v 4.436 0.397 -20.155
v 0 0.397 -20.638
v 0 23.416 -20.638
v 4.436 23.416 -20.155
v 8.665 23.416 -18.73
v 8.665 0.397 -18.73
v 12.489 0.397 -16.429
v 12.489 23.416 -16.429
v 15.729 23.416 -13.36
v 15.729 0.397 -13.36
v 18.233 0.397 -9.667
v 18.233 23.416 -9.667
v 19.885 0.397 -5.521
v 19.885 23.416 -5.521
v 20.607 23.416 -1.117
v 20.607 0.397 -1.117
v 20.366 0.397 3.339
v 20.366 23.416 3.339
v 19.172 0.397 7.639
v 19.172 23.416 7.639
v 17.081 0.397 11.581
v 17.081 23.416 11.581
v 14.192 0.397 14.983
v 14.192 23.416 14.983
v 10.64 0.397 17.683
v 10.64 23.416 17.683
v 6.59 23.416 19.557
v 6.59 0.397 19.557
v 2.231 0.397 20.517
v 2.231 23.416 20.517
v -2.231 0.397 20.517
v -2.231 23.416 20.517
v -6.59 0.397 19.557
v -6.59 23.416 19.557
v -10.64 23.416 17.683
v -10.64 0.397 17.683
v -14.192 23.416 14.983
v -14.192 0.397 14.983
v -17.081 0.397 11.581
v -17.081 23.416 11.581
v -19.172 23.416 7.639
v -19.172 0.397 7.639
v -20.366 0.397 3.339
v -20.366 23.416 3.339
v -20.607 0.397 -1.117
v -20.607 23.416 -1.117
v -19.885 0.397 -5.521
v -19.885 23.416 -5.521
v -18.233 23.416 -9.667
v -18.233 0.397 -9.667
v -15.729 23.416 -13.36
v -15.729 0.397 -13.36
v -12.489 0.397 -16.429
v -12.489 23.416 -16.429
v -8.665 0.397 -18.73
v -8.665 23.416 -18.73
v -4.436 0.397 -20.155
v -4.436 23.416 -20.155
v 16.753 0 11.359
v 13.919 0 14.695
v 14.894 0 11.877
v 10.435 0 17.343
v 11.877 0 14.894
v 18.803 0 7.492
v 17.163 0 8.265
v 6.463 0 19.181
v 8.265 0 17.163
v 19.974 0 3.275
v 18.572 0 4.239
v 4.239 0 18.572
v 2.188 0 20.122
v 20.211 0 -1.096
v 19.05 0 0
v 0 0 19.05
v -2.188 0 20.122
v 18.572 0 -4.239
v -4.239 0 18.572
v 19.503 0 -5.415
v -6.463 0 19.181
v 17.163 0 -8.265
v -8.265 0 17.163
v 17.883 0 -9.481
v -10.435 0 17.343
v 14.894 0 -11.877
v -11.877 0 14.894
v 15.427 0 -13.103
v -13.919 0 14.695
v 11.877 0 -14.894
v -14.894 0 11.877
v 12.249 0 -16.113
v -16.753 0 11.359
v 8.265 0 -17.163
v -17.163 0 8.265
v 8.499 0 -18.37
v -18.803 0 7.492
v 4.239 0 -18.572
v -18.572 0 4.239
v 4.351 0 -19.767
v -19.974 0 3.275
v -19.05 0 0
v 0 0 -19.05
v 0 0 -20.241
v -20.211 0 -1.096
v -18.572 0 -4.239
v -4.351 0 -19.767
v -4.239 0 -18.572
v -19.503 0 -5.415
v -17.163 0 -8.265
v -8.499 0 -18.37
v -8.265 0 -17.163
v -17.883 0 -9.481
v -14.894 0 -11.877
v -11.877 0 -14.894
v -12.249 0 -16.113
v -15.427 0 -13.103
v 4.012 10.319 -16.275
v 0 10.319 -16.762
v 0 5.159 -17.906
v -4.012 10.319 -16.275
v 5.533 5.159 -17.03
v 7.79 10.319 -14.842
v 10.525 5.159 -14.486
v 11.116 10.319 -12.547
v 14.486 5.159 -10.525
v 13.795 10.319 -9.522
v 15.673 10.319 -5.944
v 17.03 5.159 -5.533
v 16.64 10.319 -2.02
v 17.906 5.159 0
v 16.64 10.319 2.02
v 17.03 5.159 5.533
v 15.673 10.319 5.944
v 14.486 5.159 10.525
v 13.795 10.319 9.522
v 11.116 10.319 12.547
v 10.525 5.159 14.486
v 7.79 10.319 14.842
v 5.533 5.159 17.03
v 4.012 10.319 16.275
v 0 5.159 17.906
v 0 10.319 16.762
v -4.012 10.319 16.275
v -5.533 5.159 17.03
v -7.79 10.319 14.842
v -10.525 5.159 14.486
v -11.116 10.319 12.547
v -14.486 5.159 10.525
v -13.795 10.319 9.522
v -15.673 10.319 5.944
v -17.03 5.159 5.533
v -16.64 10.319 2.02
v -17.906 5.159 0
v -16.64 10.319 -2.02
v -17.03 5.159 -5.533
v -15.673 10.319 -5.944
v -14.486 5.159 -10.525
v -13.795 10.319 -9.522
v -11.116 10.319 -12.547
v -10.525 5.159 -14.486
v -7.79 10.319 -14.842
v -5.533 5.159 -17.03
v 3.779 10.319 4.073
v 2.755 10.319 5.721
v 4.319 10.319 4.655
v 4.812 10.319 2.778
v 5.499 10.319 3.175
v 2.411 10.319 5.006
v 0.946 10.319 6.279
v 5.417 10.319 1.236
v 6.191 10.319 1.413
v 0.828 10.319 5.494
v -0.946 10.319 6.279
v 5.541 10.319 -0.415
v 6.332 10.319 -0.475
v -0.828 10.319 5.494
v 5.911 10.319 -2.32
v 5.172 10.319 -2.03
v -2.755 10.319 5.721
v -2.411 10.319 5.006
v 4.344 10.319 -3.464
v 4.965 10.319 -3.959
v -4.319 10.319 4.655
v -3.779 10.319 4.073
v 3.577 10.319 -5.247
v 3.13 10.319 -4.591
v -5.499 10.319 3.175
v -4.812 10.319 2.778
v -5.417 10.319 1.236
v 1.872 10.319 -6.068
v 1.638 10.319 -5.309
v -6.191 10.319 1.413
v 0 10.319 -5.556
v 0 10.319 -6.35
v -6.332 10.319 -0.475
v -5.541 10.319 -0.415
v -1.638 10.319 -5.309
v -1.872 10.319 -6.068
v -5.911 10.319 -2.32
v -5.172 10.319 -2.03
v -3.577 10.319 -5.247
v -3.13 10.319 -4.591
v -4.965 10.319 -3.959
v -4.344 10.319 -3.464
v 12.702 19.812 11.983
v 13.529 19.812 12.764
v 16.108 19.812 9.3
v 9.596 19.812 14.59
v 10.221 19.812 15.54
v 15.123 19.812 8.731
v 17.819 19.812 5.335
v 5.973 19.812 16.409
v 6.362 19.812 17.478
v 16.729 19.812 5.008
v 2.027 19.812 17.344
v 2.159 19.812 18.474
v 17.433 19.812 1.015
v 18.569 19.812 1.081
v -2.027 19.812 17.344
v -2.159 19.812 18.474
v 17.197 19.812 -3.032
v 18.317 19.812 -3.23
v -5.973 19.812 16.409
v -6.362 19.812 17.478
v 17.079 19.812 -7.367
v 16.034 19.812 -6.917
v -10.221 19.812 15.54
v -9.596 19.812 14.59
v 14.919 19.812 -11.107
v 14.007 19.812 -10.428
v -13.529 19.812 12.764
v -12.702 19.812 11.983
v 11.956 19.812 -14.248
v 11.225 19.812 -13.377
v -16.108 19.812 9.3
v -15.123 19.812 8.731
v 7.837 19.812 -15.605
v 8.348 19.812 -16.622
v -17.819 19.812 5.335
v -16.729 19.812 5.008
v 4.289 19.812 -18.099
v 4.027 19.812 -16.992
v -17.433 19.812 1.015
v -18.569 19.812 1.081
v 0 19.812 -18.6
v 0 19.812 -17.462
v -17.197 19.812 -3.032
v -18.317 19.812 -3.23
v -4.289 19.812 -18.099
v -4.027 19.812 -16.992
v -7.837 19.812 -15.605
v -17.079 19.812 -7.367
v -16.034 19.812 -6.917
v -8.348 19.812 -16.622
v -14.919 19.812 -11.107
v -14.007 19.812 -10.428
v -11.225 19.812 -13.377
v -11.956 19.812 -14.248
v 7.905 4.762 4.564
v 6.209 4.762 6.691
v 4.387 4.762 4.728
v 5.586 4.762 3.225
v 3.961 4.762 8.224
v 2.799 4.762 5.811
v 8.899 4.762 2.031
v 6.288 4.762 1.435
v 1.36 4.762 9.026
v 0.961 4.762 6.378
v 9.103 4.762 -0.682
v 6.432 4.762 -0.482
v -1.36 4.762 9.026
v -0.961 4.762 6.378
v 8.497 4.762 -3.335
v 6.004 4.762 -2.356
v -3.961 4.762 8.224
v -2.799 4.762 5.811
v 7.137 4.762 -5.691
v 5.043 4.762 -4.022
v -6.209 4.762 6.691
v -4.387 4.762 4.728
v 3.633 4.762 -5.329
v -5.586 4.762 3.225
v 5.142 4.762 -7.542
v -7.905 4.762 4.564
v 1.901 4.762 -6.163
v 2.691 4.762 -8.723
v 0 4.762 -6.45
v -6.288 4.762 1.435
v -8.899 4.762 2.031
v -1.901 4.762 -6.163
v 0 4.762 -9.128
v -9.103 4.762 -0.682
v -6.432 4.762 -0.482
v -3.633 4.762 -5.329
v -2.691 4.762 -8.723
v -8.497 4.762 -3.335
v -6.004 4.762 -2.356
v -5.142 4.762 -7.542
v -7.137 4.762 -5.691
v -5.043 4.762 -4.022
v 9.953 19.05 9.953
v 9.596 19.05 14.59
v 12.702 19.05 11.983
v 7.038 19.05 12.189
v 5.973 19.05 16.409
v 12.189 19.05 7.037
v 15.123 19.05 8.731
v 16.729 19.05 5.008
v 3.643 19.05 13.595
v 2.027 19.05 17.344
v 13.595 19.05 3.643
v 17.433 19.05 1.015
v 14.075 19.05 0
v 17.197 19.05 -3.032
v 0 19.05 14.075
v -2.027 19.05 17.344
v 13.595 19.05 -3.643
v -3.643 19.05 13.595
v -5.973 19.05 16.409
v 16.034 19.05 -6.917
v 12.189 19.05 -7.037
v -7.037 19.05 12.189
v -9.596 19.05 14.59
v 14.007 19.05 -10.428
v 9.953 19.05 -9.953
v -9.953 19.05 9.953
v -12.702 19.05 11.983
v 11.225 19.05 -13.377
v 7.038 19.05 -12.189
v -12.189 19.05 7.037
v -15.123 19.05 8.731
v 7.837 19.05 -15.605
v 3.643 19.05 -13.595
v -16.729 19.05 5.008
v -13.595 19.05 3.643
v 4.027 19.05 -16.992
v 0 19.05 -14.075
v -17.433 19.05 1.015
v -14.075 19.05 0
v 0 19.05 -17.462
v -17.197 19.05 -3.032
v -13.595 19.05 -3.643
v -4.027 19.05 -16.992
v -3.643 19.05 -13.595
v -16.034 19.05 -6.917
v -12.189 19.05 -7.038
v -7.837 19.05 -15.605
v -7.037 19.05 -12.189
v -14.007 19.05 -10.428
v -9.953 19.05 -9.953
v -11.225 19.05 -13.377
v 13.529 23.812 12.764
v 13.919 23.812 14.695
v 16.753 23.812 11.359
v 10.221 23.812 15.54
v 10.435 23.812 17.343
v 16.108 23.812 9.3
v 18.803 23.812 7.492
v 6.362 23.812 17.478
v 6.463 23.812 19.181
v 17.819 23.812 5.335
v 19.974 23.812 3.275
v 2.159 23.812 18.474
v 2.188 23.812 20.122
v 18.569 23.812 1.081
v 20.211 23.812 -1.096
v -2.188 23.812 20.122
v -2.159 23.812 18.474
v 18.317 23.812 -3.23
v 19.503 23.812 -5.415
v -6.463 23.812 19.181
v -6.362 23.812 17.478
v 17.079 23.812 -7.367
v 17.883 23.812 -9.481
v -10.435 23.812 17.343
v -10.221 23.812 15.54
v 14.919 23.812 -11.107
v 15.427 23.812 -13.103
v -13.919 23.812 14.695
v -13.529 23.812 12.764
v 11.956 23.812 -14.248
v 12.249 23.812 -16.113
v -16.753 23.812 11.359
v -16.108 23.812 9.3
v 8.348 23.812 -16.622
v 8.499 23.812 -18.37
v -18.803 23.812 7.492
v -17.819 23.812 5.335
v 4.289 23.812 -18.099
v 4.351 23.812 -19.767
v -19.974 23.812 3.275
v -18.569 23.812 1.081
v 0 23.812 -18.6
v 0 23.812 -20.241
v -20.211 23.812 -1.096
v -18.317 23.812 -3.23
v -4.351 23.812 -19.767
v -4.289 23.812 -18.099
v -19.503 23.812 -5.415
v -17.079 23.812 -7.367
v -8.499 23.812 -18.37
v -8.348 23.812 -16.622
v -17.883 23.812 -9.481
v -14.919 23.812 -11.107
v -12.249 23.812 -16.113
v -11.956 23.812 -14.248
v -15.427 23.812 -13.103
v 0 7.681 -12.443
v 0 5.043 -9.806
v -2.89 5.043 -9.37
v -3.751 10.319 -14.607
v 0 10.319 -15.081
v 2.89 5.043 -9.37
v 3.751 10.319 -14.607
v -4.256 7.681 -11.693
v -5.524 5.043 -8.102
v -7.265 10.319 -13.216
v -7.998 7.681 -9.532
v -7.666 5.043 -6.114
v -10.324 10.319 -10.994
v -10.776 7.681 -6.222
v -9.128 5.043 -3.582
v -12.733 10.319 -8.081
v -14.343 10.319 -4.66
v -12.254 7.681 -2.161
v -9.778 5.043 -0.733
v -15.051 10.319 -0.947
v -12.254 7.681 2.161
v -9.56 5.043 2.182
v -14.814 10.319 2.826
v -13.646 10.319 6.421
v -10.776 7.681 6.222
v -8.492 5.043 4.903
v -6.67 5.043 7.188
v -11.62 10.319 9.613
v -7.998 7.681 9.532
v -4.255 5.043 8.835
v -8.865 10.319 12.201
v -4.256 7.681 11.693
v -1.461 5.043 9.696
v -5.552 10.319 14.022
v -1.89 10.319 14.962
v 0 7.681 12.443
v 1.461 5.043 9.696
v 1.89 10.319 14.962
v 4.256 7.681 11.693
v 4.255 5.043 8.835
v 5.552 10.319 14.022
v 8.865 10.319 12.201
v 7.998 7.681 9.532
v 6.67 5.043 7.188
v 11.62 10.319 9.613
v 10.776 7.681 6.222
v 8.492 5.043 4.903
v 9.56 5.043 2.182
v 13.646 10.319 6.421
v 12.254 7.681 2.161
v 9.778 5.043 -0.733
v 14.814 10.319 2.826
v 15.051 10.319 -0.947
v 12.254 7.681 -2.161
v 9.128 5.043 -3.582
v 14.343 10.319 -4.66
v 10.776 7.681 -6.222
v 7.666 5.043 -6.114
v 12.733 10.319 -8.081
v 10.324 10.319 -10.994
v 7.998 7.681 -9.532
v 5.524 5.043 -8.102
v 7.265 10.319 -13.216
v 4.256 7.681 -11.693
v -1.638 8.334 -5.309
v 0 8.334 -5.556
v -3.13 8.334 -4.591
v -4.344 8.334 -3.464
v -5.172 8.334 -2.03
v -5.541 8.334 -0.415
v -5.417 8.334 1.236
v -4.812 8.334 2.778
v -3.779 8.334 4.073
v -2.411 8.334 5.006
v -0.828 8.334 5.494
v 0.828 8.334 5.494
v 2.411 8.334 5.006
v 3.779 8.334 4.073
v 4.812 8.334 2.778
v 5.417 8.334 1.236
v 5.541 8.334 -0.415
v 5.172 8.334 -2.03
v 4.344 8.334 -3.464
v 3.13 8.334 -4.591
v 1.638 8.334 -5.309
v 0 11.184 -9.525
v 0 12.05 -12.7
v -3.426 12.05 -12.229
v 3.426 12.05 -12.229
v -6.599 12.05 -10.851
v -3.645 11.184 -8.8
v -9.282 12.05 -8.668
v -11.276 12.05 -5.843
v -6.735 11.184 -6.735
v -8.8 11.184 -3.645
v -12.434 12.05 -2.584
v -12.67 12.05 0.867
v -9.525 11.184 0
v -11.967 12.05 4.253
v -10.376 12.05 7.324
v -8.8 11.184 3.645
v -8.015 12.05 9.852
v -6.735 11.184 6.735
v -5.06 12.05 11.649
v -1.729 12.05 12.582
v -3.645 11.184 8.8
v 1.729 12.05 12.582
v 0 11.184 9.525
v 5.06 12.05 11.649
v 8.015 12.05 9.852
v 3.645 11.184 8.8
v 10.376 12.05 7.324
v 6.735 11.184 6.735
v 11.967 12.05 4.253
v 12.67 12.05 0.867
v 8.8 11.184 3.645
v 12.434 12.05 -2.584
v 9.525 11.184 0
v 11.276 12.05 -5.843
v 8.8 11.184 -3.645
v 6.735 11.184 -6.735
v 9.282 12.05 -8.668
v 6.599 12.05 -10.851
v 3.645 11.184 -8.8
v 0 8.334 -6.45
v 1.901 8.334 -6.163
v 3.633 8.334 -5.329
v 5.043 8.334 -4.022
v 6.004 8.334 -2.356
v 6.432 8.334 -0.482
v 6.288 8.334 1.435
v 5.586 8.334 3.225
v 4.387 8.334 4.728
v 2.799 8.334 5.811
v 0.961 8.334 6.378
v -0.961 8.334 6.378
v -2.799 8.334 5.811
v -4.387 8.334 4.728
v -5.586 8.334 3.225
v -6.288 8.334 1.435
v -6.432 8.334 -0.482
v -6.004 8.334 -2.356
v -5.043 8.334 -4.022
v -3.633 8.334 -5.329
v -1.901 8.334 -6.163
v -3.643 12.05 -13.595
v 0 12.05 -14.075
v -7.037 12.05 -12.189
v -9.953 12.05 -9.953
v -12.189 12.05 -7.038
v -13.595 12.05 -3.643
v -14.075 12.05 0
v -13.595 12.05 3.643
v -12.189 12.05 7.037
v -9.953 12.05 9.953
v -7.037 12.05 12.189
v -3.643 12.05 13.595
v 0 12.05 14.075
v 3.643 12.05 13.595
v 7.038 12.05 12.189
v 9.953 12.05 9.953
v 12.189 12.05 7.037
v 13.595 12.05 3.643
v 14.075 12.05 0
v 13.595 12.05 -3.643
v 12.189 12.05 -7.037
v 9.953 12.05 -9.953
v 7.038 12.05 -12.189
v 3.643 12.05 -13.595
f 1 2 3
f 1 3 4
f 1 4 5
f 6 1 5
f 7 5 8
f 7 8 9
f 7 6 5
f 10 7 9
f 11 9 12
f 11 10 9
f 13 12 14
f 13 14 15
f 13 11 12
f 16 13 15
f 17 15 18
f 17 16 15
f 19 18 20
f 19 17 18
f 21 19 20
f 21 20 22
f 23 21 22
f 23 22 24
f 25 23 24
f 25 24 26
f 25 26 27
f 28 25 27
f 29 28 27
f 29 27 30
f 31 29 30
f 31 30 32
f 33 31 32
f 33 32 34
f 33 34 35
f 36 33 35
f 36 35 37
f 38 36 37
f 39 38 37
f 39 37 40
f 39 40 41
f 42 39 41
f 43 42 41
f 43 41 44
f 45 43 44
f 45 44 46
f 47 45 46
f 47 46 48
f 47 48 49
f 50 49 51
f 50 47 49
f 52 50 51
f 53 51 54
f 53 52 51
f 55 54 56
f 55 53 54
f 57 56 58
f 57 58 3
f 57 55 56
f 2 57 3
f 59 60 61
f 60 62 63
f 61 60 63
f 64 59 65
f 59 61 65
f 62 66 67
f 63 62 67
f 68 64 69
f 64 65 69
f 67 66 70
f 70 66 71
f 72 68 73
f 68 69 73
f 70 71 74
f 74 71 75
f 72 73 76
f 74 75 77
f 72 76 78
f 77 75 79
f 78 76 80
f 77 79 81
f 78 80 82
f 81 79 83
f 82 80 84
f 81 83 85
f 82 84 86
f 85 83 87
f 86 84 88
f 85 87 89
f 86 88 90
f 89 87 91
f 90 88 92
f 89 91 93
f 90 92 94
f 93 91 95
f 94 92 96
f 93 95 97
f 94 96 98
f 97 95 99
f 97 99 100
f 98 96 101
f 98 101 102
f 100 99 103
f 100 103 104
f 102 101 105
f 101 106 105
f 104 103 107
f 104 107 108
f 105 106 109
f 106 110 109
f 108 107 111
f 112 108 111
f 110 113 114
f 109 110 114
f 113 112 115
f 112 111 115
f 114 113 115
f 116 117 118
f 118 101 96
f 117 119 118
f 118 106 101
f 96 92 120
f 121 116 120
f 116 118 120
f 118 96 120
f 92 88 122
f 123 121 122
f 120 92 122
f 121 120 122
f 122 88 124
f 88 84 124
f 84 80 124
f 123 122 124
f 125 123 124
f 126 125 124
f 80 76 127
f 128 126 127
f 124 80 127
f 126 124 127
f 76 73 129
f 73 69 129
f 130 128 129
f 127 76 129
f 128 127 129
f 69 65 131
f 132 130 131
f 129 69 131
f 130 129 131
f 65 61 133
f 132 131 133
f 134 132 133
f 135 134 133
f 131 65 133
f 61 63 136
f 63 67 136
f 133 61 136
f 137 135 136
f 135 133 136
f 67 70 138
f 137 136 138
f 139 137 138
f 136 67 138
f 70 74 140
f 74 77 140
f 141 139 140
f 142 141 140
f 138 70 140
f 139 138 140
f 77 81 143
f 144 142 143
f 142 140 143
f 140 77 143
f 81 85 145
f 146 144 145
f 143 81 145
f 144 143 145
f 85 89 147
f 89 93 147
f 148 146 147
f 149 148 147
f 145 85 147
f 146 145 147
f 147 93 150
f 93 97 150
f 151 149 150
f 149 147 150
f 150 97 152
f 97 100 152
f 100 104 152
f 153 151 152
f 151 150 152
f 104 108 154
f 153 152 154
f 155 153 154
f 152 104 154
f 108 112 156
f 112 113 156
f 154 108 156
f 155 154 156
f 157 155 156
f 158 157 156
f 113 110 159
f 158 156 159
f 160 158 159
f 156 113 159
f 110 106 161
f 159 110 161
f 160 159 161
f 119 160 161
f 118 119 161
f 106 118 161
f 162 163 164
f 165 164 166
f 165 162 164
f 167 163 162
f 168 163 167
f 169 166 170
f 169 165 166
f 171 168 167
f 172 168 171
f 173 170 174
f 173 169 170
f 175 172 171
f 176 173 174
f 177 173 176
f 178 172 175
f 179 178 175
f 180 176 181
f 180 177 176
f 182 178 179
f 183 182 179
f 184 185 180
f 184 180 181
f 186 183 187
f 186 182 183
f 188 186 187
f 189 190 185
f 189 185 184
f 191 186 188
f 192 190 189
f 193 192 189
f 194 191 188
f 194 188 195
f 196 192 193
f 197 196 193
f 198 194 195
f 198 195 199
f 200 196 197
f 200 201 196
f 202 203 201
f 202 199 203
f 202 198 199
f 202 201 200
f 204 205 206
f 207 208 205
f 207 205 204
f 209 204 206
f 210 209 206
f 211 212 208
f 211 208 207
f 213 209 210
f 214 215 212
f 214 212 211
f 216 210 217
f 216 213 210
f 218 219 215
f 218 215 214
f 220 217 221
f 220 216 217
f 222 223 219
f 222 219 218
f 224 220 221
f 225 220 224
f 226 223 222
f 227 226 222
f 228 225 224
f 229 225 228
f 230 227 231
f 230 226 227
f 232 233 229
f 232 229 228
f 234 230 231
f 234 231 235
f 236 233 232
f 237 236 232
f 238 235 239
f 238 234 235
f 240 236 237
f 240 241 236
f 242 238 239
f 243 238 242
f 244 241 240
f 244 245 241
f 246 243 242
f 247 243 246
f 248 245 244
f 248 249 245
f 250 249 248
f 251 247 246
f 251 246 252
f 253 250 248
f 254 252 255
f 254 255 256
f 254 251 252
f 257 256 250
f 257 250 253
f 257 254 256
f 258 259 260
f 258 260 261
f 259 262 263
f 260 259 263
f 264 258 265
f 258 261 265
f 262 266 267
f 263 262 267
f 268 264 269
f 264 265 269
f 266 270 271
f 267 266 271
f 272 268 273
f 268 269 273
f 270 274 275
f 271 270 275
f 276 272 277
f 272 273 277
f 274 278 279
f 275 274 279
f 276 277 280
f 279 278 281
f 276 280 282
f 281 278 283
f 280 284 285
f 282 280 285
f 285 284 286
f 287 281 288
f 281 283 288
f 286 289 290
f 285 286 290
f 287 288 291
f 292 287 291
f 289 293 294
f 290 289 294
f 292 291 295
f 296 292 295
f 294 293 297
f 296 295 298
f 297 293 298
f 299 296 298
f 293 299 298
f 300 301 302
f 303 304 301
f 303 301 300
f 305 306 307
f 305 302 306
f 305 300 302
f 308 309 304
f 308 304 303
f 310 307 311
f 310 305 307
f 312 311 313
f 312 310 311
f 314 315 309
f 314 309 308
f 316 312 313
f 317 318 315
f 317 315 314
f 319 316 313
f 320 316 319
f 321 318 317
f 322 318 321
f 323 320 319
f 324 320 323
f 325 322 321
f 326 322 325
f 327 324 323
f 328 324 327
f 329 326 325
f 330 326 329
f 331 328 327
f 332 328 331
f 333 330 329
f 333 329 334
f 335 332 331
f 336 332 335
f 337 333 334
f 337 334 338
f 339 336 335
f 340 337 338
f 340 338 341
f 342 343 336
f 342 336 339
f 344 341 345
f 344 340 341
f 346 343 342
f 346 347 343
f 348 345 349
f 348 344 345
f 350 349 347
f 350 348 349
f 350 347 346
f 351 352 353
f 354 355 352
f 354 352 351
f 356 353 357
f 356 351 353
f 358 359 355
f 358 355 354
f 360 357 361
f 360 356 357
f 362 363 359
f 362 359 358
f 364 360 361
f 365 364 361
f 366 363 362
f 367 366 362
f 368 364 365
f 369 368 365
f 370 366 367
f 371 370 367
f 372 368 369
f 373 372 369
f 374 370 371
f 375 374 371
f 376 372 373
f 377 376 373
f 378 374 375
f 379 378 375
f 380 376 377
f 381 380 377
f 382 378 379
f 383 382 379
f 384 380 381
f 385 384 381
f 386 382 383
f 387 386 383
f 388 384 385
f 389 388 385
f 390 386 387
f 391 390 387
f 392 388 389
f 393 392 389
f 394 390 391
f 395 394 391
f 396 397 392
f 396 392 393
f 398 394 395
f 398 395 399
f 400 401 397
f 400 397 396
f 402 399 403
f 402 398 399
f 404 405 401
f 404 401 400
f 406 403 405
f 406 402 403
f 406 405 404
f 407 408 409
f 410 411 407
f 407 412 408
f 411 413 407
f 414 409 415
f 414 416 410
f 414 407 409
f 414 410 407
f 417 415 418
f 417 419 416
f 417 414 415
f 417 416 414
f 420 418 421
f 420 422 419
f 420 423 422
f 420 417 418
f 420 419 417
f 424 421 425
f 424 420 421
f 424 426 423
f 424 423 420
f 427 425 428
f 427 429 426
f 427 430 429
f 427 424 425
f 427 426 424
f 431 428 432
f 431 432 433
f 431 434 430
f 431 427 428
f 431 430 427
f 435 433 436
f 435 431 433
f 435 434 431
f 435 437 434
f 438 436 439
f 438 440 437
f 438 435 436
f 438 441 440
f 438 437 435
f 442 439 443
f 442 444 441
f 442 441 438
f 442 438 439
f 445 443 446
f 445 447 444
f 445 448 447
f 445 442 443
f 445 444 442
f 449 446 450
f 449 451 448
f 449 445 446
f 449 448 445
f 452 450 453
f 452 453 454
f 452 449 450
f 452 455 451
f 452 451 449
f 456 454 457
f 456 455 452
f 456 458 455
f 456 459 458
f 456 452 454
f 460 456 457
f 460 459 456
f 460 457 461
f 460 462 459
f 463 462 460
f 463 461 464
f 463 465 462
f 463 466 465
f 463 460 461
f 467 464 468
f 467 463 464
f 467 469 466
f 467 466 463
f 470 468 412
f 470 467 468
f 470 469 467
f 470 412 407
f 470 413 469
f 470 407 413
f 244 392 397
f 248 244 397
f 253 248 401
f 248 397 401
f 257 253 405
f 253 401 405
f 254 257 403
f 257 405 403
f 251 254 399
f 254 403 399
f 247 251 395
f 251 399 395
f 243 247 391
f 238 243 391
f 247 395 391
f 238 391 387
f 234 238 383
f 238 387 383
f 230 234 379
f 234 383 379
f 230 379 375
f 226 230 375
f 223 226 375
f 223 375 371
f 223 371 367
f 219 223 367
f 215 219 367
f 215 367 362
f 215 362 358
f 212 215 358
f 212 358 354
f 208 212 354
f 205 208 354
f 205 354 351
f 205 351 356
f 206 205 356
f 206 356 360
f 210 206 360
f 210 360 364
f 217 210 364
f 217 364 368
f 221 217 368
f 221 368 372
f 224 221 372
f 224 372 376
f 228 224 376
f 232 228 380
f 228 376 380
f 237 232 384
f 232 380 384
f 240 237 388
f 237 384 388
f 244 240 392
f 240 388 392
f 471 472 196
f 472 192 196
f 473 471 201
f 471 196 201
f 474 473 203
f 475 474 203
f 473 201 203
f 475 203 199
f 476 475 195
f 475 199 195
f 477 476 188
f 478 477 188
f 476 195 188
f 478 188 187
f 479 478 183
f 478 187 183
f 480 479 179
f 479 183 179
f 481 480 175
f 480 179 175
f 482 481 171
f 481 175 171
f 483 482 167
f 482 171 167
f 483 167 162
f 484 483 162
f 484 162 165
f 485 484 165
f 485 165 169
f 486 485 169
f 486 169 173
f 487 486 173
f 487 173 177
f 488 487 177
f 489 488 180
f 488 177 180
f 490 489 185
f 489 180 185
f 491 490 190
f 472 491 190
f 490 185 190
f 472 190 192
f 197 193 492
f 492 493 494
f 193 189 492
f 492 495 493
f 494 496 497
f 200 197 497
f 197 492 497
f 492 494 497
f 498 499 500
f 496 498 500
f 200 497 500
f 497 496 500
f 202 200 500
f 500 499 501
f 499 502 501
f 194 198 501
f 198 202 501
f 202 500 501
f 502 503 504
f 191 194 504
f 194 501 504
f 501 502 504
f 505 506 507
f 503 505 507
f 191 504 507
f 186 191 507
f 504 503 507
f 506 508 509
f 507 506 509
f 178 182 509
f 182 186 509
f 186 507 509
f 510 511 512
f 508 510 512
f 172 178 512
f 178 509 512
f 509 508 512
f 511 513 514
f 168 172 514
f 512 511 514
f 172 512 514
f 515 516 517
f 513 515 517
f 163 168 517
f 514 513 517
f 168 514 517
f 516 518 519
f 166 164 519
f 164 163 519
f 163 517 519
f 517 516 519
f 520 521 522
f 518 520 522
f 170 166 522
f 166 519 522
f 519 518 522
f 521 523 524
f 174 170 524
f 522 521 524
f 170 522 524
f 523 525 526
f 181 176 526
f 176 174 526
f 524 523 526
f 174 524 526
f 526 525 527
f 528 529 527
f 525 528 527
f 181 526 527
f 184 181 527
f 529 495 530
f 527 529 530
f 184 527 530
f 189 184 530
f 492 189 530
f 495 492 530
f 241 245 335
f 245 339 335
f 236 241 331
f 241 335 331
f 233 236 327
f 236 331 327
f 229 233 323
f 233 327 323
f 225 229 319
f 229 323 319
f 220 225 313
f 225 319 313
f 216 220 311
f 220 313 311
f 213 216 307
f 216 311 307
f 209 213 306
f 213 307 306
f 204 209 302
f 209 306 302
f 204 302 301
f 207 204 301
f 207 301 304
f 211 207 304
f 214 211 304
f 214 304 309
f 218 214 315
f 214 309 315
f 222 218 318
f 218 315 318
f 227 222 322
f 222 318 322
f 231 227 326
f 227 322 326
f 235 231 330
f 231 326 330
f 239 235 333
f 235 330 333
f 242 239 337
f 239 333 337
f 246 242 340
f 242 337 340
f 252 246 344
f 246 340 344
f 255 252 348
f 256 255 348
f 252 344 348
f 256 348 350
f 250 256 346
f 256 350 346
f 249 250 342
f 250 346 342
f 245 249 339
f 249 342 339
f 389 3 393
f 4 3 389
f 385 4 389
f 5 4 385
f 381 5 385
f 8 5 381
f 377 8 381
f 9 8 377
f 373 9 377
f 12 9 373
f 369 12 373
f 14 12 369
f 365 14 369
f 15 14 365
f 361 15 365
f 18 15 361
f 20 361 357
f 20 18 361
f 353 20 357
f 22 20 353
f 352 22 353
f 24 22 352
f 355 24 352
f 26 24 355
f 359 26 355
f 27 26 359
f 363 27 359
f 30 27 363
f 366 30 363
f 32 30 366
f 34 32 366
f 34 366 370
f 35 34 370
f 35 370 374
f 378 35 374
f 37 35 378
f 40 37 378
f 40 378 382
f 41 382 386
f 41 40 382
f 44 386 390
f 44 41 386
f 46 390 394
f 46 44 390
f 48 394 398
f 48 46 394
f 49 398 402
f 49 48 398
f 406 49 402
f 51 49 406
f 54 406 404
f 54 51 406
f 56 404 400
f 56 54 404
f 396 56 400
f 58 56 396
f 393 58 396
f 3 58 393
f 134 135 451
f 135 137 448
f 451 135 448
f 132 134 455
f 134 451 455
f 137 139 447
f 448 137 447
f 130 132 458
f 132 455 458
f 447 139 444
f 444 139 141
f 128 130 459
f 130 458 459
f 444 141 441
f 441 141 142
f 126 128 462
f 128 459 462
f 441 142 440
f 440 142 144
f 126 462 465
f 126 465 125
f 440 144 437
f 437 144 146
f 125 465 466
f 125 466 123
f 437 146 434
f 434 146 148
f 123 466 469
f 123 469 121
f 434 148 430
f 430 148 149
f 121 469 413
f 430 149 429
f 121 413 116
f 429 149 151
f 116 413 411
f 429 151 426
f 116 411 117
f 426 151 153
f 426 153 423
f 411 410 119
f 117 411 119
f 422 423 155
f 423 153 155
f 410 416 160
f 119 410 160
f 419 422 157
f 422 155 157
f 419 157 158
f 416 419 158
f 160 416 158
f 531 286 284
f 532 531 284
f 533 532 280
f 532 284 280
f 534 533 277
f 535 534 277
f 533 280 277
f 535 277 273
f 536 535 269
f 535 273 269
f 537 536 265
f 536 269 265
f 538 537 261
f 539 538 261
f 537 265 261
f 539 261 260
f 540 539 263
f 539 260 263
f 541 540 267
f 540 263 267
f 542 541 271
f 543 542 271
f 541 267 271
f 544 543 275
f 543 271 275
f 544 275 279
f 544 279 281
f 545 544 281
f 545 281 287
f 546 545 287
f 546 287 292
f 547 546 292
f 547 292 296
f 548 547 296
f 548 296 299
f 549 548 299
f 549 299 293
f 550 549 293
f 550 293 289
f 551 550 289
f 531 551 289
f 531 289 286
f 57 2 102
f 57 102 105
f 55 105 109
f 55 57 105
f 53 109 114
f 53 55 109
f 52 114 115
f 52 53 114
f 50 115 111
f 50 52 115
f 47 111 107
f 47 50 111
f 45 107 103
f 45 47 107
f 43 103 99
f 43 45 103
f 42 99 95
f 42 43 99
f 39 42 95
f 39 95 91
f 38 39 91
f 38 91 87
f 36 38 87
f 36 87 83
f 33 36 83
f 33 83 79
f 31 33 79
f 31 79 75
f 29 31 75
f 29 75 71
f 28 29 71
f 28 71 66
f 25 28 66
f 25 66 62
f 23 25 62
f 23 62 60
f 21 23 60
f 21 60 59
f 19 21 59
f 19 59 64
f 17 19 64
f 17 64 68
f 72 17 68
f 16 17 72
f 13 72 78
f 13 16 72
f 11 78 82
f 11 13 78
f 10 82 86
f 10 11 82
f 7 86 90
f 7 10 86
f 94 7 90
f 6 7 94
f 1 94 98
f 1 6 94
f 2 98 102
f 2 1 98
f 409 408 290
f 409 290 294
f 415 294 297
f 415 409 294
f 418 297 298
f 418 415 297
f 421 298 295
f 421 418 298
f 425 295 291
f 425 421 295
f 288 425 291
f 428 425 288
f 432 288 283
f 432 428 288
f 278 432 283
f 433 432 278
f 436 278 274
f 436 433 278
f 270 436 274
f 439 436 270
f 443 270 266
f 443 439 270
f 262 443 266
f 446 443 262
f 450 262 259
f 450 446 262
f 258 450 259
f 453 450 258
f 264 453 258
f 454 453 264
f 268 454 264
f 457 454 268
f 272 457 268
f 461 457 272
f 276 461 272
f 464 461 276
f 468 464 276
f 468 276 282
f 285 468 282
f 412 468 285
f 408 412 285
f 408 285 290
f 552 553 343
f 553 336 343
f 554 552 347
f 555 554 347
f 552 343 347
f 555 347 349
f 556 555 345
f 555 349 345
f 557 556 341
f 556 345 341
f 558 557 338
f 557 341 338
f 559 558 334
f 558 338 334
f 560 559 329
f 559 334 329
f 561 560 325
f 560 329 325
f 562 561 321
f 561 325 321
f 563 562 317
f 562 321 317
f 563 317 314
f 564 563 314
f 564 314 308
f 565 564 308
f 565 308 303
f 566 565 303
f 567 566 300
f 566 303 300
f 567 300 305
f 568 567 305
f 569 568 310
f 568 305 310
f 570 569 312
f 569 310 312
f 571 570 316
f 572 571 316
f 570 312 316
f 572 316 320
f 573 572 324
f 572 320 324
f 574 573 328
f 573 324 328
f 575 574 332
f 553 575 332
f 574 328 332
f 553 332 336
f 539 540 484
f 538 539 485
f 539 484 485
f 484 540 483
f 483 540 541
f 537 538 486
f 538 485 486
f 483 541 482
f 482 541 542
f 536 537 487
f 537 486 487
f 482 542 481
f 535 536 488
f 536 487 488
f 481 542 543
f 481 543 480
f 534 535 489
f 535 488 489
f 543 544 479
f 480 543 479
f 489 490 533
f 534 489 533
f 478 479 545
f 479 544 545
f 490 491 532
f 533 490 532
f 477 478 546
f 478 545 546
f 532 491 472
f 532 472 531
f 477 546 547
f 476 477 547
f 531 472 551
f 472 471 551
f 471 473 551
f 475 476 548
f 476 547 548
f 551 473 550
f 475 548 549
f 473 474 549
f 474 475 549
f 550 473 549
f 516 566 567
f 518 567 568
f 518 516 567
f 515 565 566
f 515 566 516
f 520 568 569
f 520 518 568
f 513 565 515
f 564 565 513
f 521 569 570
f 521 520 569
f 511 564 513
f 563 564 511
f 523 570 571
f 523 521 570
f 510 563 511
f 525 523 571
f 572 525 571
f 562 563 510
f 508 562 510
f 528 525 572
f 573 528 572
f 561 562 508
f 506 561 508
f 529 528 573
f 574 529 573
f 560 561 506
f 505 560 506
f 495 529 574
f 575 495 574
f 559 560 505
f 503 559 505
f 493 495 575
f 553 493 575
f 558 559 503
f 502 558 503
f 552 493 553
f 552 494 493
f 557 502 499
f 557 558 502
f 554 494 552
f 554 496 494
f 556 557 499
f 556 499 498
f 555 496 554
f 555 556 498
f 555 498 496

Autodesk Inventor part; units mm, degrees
ref_plane "YZ Plane" through (0, 0, 0) normal (1, 0, 0) x (0, 1, 0)
ref_plane "XZ Plane" through (0, 0, 0) normal (0, 1, 0) x (-1, 0, 0)
ref_plane "XY Plane" through (0, 0, 0) normal (0, 0, 1) x (1, 0, 0)
sketch "Sketch2" plane through (0, 0, 0) normal (1, 0, 0) x (0, 1, 0)
  line L0 (0, 0) -> (19.05, 0)
  line L1 (19.05, 0) -> (19.05, -6.35)
  line L2 (19.05, -6.35) -> (0, -6.35)
  line L3 (0, -6.35) -> (0, 0)
  line L4 (0, 0) -> (19.05, 0)
  line L5 (19.05, 0) -> (19.05, -20.6375)
  line L6 (19.05, -20.6375) -> (0, -20.6375)
  line L7 (0, -20.6375) -> (0, 0)
  line L8 (0, -16.7624) -> (10.3188, -16.7624) construction
  line L9 (10.3188, -16.7624) -> (10.3188, -6.35)
  line L10 (10.3188, -6.35) -> (0, -6.35)
  line L11 (0, -6.35) -> (0, -16.7624)
  line L12 (10.3188, -16.7624) -> (0, -19.05)
  line L13 (6.35, -20.6375) -> (19.05, -17.4625)
  line L14 (19.05, 0) -> (12.05, 0)
  line L15 (12.05, 0) -> (12.05, -13.975)
  line L16 (12.05, -13.975) -> (19.05, -13.975)
  line L17 (19.05, -13.975) -> (19.05, 0)
  line L18 (10.3188, -15.0812) -> (4.7625, -15.0812)
  line L19 (4.7625, -15.0812) -> (4.7625, -6.35)
  line L20 (4.7625, -6.35) -> (10.3188, -6.35)
  line L21 (10.3188, -6.35) -> (10.3188, -15.0812)
  line L22 (4.7625, -9.525) -> (10.3188, -15.0812)
  line L23 (19.05, 0) -> (23.8125, 0)
  line L24 (23.8125, 0) -> (23.8125, -20.6375)
  line L25 (23.8125, -20.6375) -> (19.05, -20.6375)
  line L26 (19.05, -20.6375) -> (19.05, 0)
  line L27 (23.8125, 0) -> (19.8125, 0)
  line L28 (19.8125, 0) -> (19.8125, -18.5)
  line L29 (19.8125, -18.5) -> (23.8125, -18.5)
  line L30 (23.8125, -18.5) -> (23.8125, 0)
  line L31 (19.8125, -17.4625) -> (19.05, -17.4625)
  line L32 (12.05, -12.7) -> (10.3188, -6.35)
  line L33 (10.3188, -6.35) -> (8.3344, -6.35)
  line L34 (8.3344, -6.35) -> (8.3344, -5.5562)
  line L35 (8.3344, -5.5562) -> (10.3188, -5.5562)
  line L36 (10.3188, -5.5562) -> (10.3188, -6.35)
  point P0 (19.05, -13.975)
  point P1 (12.05, -6.35)
  point P2 (4.7625, -6.35)
  point P3 (12.05, 0)
  point P4 (23.8125, -18.5)
  point P5 (10.3188, -6.35)
  point P6 (10.3188, -6.35)
  dimension "d4" = 19.05
  dimension "d5" = 6.35
  dimension "d6" = 20.6375
  dimension "d7" = 12.5
  dimension "d9" = 10.3187
  dimension "d11" = 19.05
  dimension "d35" = 6.35
  dimension "d36" = 7
  dimension "d37" = 13.975
  dimension "d38" = 17.4625
  dimension "d41" = 4.7625
  dimension "d42" = 5.5563
  dimension "d43" = 3.175
  dimension "d54" = 4.7625
  dimension "d55" = 4
  dimension "d56" = 18.5
  dimension "d57" = 12.7
  dimension "d58" = 1.9844
  dimension "d59" = 0.7937
revolve "Revolution1" add sketch "Sketch2" angle 360 about axis through (0, 0, 0) along (0, 1, 0) contours L2 L9 L22 L19 | L32 L15 L16 L5 L13 L6 L7 L12 L9 | L2 L34 L35 L36 | L28 L29 L24 L25 L5 L31 | L5 L6 L13
chamfer "Chamfer1" distance 0.3969 angle 45 3 edges at (0, 0, 20.6375) (0, 4.7625, 9.525) (0, 23.8125, 20.6375)
thicken "Thicken1" operation cut thickness 0.1 both sides no extend neighbours no toward (0.1604113, 0, -0.9870503) faces at (2.9676, 22.4792, -18.2604)
thicken "Thicken2" operation cut thickness 0.1 both sides no extend neighbours no toward (0.0804666, 0, -0.9967573) faces at (1.1245, 16.7167, -13.9297)
thicken "Thicken4" operation add thickness 0.1 both sides no extend neighbours yes toward (0.0804666, 0, -0.9967573) faces at (0.511, 5.9531, -6.3294)
properties part number "Flywheel" material "Brass, Soft Yellow"
